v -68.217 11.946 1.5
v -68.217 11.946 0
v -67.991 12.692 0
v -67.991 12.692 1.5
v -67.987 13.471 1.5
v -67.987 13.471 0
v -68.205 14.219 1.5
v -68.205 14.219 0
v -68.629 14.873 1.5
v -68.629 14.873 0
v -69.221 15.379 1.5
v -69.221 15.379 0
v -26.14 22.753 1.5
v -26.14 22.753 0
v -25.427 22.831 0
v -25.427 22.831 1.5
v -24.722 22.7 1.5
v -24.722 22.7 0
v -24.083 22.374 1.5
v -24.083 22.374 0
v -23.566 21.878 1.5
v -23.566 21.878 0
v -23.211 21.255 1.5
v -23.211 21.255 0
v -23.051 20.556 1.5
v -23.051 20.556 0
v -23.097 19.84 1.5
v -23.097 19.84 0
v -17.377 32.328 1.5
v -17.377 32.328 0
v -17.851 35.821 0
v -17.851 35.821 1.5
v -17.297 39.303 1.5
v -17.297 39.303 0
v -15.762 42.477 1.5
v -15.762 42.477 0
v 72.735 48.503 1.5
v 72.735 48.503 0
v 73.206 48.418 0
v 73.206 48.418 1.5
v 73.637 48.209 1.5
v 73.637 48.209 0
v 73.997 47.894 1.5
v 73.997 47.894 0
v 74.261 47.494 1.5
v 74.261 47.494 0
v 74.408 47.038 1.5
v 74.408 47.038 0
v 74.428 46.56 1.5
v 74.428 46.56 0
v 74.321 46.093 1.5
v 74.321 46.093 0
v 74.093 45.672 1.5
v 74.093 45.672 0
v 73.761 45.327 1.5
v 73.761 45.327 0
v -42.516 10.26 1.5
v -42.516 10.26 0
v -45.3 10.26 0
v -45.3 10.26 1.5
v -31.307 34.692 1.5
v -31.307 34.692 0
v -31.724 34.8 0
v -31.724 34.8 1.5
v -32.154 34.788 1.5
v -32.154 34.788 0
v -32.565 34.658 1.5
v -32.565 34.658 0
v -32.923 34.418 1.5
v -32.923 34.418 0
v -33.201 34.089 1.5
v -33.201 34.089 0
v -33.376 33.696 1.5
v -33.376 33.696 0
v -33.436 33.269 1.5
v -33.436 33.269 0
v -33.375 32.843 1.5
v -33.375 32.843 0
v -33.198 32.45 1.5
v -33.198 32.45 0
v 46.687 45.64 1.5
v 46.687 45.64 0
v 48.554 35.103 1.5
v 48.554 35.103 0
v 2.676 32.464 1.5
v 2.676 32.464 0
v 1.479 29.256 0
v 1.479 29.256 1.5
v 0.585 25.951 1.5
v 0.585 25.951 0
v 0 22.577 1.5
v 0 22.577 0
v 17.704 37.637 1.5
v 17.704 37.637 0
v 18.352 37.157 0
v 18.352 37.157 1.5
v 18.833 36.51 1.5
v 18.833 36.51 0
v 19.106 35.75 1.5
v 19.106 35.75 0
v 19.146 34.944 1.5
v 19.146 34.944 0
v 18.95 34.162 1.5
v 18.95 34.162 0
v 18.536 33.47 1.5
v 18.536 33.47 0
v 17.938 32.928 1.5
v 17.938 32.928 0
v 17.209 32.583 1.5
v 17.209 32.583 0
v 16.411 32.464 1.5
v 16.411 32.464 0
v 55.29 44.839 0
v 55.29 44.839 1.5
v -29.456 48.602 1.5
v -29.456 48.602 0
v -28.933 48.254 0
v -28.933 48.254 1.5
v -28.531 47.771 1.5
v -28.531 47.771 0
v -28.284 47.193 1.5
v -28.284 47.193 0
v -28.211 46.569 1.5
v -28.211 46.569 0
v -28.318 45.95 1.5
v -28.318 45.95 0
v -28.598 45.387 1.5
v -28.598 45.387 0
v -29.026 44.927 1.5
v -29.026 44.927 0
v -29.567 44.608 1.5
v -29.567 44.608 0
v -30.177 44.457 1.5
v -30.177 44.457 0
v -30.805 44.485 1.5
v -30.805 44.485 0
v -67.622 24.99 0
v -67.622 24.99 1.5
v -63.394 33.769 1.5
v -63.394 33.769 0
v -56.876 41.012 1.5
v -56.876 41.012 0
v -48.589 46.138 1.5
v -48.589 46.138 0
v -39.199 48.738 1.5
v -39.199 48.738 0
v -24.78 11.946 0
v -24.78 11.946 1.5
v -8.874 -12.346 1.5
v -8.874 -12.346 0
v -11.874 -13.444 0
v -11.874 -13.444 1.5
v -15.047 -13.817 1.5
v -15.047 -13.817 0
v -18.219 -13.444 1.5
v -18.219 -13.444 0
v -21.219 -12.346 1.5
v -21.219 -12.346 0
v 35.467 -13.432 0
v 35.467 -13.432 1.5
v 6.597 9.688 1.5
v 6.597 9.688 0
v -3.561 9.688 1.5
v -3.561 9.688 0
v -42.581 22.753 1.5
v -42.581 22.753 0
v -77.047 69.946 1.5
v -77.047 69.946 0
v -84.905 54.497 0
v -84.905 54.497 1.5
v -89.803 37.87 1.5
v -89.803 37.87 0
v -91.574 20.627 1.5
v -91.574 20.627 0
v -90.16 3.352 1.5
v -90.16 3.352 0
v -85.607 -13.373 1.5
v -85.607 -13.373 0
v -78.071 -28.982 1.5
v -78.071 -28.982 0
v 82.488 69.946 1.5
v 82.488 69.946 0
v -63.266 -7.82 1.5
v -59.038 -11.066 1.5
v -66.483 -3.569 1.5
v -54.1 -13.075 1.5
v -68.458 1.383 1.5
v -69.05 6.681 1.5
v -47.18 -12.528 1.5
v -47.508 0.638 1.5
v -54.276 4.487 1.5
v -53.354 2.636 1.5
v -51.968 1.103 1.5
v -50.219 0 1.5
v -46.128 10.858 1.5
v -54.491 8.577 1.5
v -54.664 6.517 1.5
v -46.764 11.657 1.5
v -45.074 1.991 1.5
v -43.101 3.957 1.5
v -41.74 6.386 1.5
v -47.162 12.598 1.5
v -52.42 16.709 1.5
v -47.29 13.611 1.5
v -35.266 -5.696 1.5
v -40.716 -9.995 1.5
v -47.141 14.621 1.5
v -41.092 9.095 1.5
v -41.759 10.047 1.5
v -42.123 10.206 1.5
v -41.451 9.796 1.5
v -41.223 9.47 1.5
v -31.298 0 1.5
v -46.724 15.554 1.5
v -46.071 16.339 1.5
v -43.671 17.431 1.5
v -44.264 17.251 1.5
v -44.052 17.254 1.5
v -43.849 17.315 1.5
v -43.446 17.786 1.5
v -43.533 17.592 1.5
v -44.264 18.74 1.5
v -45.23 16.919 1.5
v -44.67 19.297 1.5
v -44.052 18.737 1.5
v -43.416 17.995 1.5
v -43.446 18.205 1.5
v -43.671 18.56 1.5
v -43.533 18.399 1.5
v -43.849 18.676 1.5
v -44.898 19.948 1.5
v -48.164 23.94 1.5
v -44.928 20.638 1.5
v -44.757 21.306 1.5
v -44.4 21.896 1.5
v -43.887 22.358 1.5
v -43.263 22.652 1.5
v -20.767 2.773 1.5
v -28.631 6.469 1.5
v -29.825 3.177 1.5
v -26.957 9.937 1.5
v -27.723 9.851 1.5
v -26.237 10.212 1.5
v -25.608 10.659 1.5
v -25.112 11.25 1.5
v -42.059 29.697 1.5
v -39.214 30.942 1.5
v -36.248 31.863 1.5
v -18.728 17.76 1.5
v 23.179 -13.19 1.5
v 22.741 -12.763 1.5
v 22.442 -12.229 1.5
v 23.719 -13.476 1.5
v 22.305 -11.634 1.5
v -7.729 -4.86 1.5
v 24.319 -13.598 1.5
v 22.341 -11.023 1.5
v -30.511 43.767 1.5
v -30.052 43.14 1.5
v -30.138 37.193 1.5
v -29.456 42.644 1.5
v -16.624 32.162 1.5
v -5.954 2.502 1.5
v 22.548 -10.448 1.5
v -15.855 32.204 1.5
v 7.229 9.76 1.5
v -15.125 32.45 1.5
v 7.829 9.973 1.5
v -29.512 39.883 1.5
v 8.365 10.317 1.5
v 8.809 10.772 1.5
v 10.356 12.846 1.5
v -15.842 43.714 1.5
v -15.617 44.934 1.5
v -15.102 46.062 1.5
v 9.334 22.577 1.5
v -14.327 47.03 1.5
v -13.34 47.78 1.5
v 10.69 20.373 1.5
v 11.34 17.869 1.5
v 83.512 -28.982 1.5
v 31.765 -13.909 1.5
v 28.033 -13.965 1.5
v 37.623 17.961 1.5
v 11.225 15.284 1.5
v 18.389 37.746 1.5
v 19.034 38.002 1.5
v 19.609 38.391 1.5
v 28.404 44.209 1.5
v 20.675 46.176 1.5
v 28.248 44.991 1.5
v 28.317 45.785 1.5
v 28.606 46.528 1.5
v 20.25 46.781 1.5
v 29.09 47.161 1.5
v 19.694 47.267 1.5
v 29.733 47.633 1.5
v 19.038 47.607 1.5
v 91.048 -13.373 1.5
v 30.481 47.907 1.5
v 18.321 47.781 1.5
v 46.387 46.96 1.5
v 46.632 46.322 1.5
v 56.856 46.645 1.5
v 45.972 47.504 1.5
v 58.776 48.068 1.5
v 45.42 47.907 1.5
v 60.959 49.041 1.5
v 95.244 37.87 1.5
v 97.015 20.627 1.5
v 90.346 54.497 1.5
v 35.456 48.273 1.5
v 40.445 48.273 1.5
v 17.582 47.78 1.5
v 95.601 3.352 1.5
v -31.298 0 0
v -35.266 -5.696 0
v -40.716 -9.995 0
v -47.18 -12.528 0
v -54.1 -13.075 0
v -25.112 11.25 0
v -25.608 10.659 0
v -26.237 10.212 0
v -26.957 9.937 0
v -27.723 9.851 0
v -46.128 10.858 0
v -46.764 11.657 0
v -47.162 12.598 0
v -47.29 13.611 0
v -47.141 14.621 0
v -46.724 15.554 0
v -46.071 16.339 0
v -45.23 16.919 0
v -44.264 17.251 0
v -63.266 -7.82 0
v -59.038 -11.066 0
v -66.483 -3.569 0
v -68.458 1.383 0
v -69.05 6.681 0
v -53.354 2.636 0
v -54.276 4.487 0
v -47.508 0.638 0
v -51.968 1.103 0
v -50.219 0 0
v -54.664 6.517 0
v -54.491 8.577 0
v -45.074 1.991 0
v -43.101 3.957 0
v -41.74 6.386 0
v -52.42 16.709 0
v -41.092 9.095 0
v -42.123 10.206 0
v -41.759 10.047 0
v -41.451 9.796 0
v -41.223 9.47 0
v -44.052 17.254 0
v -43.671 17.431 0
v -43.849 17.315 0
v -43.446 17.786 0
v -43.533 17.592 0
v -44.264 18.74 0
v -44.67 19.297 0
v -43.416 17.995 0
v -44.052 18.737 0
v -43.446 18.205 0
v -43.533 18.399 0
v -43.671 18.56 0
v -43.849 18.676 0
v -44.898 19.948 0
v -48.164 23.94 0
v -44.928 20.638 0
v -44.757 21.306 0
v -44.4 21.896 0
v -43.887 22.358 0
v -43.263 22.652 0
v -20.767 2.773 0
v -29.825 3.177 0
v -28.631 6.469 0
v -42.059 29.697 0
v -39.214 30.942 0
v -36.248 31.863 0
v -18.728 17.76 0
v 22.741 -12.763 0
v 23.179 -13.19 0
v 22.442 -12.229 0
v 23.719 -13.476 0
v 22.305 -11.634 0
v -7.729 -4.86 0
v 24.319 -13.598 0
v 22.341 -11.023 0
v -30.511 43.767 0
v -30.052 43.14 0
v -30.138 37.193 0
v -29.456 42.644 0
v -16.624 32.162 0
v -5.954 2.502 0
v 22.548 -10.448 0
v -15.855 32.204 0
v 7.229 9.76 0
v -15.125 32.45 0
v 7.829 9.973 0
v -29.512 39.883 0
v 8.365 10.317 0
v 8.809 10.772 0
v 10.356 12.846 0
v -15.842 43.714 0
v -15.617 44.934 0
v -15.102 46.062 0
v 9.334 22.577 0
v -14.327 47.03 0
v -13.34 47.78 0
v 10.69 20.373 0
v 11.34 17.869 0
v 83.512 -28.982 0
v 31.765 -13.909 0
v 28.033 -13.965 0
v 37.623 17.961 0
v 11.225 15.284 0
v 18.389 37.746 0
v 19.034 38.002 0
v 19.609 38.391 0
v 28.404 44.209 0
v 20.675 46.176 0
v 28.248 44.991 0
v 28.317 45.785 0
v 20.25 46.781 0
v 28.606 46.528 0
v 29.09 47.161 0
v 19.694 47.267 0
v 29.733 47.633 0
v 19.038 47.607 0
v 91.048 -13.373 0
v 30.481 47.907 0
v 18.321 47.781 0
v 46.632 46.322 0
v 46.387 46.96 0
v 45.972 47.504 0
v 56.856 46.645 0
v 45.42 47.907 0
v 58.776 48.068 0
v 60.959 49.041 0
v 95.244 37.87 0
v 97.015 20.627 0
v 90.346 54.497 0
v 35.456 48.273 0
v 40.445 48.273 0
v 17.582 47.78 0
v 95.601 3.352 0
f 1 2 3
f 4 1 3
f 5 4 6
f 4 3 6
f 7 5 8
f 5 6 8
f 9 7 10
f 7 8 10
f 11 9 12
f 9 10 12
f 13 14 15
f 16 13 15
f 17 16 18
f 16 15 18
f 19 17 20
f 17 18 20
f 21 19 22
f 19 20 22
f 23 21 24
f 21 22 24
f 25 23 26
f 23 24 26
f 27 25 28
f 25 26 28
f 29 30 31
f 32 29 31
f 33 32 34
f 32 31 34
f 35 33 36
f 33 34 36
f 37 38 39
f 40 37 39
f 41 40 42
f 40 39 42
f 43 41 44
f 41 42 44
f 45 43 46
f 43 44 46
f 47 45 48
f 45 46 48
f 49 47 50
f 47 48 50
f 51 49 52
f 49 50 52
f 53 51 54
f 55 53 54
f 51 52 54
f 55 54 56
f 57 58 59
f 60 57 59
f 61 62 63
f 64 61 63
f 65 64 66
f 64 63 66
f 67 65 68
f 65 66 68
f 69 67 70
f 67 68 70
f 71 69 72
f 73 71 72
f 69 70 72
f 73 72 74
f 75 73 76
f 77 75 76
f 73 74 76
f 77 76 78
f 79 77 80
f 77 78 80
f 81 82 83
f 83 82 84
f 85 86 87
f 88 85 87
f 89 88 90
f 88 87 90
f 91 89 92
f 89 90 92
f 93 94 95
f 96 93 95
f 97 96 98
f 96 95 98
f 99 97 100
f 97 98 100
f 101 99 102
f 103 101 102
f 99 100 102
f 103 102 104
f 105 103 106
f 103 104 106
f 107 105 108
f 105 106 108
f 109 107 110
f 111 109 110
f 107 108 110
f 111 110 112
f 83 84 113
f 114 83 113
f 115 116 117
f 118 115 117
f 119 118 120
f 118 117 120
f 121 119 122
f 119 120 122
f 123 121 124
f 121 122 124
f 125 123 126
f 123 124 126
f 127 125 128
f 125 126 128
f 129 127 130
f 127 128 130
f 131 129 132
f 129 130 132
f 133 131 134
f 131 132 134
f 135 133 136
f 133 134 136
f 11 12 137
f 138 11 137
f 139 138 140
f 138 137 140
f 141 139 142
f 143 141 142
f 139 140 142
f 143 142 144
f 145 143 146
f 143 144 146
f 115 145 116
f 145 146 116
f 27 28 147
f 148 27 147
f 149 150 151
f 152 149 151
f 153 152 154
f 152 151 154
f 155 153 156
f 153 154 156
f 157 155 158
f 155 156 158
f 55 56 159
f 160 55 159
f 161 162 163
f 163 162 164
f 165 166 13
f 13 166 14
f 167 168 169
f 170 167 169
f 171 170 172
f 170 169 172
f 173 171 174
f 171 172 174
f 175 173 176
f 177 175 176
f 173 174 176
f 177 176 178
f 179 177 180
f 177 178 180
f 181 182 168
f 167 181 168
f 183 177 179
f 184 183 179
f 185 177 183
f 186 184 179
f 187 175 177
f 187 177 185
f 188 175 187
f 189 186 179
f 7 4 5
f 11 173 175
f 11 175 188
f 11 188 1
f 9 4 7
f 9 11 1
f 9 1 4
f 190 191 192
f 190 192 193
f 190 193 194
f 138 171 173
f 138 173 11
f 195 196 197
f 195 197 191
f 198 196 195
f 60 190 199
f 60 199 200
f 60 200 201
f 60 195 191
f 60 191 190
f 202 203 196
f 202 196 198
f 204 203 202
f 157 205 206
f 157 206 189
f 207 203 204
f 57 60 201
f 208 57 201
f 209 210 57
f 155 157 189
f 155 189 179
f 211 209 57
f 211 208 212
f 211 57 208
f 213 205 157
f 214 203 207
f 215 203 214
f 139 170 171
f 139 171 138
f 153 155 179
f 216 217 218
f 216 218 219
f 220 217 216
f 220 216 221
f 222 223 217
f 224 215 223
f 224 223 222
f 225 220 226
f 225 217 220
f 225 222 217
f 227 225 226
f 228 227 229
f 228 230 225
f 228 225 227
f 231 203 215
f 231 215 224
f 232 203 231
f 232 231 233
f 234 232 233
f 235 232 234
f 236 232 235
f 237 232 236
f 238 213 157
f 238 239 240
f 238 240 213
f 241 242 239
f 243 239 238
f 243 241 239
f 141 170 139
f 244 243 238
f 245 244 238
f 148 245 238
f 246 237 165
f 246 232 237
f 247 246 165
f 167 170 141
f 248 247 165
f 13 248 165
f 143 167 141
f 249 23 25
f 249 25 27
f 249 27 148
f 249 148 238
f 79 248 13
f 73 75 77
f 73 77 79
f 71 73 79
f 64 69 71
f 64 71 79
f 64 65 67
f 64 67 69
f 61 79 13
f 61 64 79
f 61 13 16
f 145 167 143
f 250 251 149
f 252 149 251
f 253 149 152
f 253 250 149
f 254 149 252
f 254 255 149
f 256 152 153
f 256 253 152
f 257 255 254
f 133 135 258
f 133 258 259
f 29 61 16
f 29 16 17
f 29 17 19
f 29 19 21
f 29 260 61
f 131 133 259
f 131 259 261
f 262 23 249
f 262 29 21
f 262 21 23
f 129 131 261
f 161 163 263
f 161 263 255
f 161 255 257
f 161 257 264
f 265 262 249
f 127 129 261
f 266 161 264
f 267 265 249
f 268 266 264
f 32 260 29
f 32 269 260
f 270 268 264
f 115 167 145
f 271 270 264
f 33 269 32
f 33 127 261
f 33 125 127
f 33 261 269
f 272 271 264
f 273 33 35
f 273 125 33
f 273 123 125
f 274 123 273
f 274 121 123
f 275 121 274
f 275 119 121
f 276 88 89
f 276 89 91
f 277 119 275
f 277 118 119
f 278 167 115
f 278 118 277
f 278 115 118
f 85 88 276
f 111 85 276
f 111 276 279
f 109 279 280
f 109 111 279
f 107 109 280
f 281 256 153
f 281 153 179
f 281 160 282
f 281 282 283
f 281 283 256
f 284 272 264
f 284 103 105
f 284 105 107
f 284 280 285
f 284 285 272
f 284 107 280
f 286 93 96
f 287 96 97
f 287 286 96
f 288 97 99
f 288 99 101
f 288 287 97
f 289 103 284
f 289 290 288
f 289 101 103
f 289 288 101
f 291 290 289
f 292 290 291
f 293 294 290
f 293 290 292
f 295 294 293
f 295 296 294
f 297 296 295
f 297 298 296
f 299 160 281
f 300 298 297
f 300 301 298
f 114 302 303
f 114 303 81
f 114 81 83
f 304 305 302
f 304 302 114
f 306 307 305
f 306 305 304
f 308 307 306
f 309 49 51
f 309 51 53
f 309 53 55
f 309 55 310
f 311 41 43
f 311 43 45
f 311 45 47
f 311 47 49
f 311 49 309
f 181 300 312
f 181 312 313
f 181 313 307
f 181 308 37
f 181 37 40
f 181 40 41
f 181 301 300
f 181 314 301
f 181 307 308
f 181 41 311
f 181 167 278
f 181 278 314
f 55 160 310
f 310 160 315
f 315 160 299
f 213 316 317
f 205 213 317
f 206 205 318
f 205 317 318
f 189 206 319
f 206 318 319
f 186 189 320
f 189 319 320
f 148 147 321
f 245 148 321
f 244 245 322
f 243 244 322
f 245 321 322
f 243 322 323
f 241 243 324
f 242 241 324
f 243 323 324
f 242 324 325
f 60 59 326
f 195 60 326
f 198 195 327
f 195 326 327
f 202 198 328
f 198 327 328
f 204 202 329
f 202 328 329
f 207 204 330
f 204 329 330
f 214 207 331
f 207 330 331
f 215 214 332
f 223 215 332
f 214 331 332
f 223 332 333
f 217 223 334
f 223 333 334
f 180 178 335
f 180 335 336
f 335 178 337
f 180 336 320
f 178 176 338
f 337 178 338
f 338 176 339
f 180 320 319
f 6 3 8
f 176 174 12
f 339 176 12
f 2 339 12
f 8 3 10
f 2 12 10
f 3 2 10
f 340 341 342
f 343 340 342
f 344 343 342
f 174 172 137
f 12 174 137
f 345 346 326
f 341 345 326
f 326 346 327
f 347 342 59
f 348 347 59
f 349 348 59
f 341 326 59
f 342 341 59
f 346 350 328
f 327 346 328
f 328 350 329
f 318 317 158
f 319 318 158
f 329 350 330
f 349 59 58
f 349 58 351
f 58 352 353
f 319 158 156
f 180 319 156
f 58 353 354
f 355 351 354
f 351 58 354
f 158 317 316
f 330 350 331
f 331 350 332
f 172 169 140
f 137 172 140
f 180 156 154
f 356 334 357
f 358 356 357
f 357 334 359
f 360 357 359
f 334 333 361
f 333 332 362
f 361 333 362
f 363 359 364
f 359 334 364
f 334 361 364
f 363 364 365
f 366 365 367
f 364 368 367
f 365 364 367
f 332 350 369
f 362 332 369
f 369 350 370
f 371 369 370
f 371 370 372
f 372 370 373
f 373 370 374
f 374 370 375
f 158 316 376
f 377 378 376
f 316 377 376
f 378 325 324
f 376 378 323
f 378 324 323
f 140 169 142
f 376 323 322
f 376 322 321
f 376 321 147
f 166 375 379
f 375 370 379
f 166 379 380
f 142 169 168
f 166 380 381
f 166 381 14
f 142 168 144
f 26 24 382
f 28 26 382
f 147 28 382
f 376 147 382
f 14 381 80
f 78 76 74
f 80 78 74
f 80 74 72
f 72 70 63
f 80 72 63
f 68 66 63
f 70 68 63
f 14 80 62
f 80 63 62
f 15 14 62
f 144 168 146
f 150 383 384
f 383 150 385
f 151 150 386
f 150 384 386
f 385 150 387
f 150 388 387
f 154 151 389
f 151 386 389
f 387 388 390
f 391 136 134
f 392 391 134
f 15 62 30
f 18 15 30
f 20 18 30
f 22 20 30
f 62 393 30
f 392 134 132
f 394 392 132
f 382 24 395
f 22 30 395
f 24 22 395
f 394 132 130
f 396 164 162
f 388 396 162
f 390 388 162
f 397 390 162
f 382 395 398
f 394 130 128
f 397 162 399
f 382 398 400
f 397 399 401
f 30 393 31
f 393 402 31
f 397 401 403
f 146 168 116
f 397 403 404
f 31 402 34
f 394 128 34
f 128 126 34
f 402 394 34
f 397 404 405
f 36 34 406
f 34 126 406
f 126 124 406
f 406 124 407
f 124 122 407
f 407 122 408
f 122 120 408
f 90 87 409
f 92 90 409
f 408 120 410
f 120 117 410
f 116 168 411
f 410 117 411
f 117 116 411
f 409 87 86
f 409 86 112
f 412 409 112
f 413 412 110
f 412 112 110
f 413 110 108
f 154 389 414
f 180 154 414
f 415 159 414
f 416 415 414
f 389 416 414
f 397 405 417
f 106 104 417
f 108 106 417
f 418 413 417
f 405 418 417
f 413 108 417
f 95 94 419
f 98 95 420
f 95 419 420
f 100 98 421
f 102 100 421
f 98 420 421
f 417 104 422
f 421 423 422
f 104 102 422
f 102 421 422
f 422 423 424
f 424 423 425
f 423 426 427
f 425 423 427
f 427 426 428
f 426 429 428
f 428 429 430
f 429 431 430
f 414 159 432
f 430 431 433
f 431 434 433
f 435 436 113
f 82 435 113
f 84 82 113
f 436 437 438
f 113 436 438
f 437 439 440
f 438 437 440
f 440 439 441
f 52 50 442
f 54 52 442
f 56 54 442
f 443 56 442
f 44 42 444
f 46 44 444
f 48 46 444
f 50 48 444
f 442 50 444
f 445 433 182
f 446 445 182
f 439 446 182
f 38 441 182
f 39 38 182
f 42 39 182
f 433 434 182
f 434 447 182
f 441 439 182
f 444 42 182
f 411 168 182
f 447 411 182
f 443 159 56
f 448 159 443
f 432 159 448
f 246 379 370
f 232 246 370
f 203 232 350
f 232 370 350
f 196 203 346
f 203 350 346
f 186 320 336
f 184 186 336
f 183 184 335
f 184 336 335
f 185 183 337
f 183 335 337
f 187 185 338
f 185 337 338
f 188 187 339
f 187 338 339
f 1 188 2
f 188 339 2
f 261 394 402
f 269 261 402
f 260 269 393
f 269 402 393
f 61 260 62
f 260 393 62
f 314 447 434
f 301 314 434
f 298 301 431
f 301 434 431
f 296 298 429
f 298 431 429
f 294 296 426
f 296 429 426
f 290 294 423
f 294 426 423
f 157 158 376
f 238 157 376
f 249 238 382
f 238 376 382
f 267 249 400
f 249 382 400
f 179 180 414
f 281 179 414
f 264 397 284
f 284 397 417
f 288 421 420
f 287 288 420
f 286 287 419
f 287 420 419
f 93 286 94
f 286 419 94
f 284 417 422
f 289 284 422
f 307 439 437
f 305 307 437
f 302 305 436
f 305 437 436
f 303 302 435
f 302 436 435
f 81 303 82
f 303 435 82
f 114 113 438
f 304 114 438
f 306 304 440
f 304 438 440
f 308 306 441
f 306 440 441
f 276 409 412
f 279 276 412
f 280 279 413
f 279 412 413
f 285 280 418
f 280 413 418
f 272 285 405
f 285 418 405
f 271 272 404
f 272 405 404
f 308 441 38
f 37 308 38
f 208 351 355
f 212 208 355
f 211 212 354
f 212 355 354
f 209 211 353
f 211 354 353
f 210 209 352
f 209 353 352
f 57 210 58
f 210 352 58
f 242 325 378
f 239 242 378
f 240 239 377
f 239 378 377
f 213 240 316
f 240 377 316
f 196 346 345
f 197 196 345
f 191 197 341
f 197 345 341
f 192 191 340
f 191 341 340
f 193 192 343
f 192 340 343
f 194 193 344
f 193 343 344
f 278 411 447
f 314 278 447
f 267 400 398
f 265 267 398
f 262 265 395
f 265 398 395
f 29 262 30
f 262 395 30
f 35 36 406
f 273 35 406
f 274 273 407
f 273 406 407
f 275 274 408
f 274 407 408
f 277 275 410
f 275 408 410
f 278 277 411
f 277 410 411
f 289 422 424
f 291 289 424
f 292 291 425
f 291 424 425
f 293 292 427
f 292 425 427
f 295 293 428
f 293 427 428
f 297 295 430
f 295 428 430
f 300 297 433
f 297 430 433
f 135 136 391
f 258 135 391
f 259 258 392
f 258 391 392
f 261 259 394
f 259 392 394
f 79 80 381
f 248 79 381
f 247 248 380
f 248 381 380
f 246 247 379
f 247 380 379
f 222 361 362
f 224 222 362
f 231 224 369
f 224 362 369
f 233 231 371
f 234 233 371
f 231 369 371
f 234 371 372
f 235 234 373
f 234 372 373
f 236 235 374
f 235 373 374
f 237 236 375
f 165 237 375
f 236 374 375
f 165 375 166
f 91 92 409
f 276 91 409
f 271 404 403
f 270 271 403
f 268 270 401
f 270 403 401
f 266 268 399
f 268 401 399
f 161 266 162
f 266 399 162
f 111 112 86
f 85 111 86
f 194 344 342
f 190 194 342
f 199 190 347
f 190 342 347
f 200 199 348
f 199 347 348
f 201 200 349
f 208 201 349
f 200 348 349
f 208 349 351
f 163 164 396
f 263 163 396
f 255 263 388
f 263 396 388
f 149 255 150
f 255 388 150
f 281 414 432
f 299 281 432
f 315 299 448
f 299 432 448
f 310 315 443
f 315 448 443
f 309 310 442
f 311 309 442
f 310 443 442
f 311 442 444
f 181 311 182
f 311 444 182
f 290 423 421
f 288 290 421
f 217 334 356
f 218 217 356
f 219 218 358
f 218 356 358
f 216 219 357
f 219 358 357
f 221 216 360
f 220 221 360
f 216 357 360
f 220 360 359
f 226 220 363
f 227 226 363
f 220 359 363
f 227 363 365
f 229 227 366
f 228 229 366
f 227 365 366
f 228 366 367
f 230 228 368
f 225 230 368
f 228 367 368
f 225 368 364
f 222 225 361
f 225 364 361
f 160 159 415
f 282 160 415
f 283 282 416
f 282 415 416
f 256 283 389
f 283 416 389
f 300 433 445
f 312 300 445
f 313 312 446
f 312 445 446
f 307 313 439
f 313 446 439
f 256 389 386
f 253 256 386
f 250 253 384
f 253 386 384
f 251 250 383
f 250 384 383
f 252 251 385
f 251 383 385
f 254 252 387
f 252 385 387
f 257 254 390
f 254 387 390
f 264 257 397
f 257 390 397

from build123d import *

# Parameters (mm, degrees)
F1_DEPTH = 1.5


with BuildPart() as f1:
    # F0 (on Top) → F1 (new body)
    with BuildSketch(Plane.XY):
        with BuildLine():
            Line((-78.070531, -28.981596), (83.511818, -28.981596))
            ThreePointArc((83.511818, -28.981596), (97.015282, 20.627403), (82.488377, 69.94642))
            Line((82.488377, 69.94642), (-77.047091, 69.94642))
            ThreePointArc((-77.047091, 69.94642), (-91.573996, 20.627403), (-78.070531, -28.981596))
        make_face()
        with BuildLine():
            ThreePointArc((-69.221243, 15.378748), (-56.875674, 41.011571), (-29.456094, 48.602439))
            ThreePointArc((-29.456094, 48.602439), (-28.318317, 45.950127), (-30.804796, 44.484958))
            ThreePointArc((-30.804796, 44.484958), (-30.30087, 43.439414), (-29.456094, 42.643514))
            ThreePointArc((-29.456094, 42.643514), (-29.754967, 38.52182), (-31.307008, 34.691826))
            ThreePointArc((-31.307008, 34.691826), (-33.073301, 34.263475), (-33.198223, 32.450281))
            ThreePointArc((-33.198223, 32.450281), (-37.743701, 31.443683), (-42.059347, 29.697312))
            ThreePointArc((-42.059347, 29.697312), (-50.547741, 20.474948), (-54.49114, 8.577283))
            ThreePointArc((-54.49114, 8.577283), (-53.878072, 3.53006), (-50.218977, 0))
            ThreePointArc((-50.218977, 0), (-44.019674, 2.905988), (-41.092087, 9.09512))
            ThreePointArc((-41.092087, 9.09512), (-41.596159, 9.931856), (-42.516142, 10.260256))
            Line((-42.516142, 10.260256), (-45.299519, 10.260256))
            ThreePointArc((-45.299519, 10.260256), (-47.249951, 14.121331), (-44.263843, 17.251067))
            ThreePointArc((-44.263843, 17.251067), (-43.416051, 17.995459), (-44.263843, 18.739851))
            ThreePointArc((-44.263843, 18.739851), (-44.75679, 21.306075), (-42.580869, 22.753095))
            Line((-42.580869, 22.753095), (-26.139516, 22.753095))
            ThreePointArc((-26.139516, 22.753095), (-23.806404, 22.144728), (-23.097219, 19.840257))
            Line((-23.097219, 19.840257), (-24.780193, 11.945932))
            ThreePointArc((-24.780193, 11.945932), (-25.908191, 10.415742), (-27.723249, 9.850567))
            ThreePointArc((-27.723249, 9.850567), (-29.192747, 4.809992), (-31.297695, 0))
            ThreePointArc((-31.297695, 0), (-40.716383, -9.995095), (-54.100201, -13.075197))
            ThreePointArc((-54.100201, -13.075197), (-66.483065, -3.568669), (-68.217009, 11.945932))
            ThreePointArc((-68.217009, 11.945932), (-68.068902, 13.852556), (-69.221243, 15.378748))
        make_face(mode=Mode.SUBTRACT)
        with BuildLine():
            ThreePointArc((-21.219255, -12.345982), (-19.944396, 10.29328), (-15.124779, 32.450281))
            ThreePointArc((-15.124779, 32.450281), (-16.238245, 32.156524), (-17.377038, 32.327555))
            ThreePointArc((-17.377038, 32.327555), (-17.701466, 37.582362), (-15.762346, 42.47706))
            ThreePointArc((-15.762346, 42.47706), (-15.39411, 45.513529), (-13.340303, 47.78016))
            Line((-13.340303, 47.78016), (17.581943, 47.78016))
            ThreePointArc((17.581943, 47.78016), (19.376598, 47.456686), (20.675082, 46.176311))
            Line((20.675082, 46.176311), (19.60909, 38.391046))
            ThreePointArc((19.60909, 38.391046), (18.718733, 37.856487), (17.703688, 37.637003))
            ThreePointArc((17.703688, 37.637003), (19.077047, 34.545895), (16.411087, 32.464135))
            Line((16.411087, 32.464135), (2.676149, 32.464135))
            ThreePointArc((2.676149, 32.464135), (0.993774, 27.613666), (0, 22.576816))
            Line((0, 22.576816), (9.333577, 22.576816))
            ThreePointArc((9.333577, 22.576816), (11.379026, 16.571914), (8.8095, 10.771892))
            ThreePointArc((8.8095, 10.771892), (7.828648, 9.973453), (6.596562, 9.687897))
            Line((6.596562, 9.687897), (-3.560899, 9.687897))
            ThreePointArc((-3.560899, 9.687897), (-6.91927, -1.159813), (-8.874034, -12.345982))
            ThreePointArc((-8.874034, -12.345982), (-15.046644, -13.81701), (-21.219255, -12.345982))
        make_face(mode=Mode.SUBTRACT)
        with BuildLine():
            ThreePointArc((24.318619, -13.598498), (22.572563, -12.506763), (22.547672, -10.447643))
            Line((22.547672, -10.447643), (37.622835, 17.960656))
            Line((37.622835, 17.960656), (28.403541, 44.209484))
            ThreePointArc((28.403541, 44.209484), (28.605897, 46.528204), (30.480955, 47.907177))
            ThreePointArc((30.480955, 47.907177), (37.950305, 48.319326), (45.419656, 47.907177))
            ThreePointArc((45.419656, 47.907177), (46.387462, 46.960221), (46.68678, 45.639697))
            Line((46.68678, 45.639697), (48.554119, 35.102576))
            Line((48.554119, 35.102576), (55.289872, 44.839408))
            ThreePointArc((55.289872, 44.839408), (57.776817, 47.408886), (60.958575, 49.040917))
            Line((60.958575, 49.040917), (72.734997, 48.503447))
            ThreePointArc((72.734997, 48.503447), (74.349534, 47.270892), (73.76077, 45.326855))
            Line((73.76077, 45.326855), (35.466932, -13.432029))
            ThreePointArc((35.466932, -13.432029), (29.89986, -13.989714), (24.318619, -13.598498))
        make_face(mode=Mode.SUBTRACT)
    extrude(amount=F1_DEPTH)


solid = f1.part
